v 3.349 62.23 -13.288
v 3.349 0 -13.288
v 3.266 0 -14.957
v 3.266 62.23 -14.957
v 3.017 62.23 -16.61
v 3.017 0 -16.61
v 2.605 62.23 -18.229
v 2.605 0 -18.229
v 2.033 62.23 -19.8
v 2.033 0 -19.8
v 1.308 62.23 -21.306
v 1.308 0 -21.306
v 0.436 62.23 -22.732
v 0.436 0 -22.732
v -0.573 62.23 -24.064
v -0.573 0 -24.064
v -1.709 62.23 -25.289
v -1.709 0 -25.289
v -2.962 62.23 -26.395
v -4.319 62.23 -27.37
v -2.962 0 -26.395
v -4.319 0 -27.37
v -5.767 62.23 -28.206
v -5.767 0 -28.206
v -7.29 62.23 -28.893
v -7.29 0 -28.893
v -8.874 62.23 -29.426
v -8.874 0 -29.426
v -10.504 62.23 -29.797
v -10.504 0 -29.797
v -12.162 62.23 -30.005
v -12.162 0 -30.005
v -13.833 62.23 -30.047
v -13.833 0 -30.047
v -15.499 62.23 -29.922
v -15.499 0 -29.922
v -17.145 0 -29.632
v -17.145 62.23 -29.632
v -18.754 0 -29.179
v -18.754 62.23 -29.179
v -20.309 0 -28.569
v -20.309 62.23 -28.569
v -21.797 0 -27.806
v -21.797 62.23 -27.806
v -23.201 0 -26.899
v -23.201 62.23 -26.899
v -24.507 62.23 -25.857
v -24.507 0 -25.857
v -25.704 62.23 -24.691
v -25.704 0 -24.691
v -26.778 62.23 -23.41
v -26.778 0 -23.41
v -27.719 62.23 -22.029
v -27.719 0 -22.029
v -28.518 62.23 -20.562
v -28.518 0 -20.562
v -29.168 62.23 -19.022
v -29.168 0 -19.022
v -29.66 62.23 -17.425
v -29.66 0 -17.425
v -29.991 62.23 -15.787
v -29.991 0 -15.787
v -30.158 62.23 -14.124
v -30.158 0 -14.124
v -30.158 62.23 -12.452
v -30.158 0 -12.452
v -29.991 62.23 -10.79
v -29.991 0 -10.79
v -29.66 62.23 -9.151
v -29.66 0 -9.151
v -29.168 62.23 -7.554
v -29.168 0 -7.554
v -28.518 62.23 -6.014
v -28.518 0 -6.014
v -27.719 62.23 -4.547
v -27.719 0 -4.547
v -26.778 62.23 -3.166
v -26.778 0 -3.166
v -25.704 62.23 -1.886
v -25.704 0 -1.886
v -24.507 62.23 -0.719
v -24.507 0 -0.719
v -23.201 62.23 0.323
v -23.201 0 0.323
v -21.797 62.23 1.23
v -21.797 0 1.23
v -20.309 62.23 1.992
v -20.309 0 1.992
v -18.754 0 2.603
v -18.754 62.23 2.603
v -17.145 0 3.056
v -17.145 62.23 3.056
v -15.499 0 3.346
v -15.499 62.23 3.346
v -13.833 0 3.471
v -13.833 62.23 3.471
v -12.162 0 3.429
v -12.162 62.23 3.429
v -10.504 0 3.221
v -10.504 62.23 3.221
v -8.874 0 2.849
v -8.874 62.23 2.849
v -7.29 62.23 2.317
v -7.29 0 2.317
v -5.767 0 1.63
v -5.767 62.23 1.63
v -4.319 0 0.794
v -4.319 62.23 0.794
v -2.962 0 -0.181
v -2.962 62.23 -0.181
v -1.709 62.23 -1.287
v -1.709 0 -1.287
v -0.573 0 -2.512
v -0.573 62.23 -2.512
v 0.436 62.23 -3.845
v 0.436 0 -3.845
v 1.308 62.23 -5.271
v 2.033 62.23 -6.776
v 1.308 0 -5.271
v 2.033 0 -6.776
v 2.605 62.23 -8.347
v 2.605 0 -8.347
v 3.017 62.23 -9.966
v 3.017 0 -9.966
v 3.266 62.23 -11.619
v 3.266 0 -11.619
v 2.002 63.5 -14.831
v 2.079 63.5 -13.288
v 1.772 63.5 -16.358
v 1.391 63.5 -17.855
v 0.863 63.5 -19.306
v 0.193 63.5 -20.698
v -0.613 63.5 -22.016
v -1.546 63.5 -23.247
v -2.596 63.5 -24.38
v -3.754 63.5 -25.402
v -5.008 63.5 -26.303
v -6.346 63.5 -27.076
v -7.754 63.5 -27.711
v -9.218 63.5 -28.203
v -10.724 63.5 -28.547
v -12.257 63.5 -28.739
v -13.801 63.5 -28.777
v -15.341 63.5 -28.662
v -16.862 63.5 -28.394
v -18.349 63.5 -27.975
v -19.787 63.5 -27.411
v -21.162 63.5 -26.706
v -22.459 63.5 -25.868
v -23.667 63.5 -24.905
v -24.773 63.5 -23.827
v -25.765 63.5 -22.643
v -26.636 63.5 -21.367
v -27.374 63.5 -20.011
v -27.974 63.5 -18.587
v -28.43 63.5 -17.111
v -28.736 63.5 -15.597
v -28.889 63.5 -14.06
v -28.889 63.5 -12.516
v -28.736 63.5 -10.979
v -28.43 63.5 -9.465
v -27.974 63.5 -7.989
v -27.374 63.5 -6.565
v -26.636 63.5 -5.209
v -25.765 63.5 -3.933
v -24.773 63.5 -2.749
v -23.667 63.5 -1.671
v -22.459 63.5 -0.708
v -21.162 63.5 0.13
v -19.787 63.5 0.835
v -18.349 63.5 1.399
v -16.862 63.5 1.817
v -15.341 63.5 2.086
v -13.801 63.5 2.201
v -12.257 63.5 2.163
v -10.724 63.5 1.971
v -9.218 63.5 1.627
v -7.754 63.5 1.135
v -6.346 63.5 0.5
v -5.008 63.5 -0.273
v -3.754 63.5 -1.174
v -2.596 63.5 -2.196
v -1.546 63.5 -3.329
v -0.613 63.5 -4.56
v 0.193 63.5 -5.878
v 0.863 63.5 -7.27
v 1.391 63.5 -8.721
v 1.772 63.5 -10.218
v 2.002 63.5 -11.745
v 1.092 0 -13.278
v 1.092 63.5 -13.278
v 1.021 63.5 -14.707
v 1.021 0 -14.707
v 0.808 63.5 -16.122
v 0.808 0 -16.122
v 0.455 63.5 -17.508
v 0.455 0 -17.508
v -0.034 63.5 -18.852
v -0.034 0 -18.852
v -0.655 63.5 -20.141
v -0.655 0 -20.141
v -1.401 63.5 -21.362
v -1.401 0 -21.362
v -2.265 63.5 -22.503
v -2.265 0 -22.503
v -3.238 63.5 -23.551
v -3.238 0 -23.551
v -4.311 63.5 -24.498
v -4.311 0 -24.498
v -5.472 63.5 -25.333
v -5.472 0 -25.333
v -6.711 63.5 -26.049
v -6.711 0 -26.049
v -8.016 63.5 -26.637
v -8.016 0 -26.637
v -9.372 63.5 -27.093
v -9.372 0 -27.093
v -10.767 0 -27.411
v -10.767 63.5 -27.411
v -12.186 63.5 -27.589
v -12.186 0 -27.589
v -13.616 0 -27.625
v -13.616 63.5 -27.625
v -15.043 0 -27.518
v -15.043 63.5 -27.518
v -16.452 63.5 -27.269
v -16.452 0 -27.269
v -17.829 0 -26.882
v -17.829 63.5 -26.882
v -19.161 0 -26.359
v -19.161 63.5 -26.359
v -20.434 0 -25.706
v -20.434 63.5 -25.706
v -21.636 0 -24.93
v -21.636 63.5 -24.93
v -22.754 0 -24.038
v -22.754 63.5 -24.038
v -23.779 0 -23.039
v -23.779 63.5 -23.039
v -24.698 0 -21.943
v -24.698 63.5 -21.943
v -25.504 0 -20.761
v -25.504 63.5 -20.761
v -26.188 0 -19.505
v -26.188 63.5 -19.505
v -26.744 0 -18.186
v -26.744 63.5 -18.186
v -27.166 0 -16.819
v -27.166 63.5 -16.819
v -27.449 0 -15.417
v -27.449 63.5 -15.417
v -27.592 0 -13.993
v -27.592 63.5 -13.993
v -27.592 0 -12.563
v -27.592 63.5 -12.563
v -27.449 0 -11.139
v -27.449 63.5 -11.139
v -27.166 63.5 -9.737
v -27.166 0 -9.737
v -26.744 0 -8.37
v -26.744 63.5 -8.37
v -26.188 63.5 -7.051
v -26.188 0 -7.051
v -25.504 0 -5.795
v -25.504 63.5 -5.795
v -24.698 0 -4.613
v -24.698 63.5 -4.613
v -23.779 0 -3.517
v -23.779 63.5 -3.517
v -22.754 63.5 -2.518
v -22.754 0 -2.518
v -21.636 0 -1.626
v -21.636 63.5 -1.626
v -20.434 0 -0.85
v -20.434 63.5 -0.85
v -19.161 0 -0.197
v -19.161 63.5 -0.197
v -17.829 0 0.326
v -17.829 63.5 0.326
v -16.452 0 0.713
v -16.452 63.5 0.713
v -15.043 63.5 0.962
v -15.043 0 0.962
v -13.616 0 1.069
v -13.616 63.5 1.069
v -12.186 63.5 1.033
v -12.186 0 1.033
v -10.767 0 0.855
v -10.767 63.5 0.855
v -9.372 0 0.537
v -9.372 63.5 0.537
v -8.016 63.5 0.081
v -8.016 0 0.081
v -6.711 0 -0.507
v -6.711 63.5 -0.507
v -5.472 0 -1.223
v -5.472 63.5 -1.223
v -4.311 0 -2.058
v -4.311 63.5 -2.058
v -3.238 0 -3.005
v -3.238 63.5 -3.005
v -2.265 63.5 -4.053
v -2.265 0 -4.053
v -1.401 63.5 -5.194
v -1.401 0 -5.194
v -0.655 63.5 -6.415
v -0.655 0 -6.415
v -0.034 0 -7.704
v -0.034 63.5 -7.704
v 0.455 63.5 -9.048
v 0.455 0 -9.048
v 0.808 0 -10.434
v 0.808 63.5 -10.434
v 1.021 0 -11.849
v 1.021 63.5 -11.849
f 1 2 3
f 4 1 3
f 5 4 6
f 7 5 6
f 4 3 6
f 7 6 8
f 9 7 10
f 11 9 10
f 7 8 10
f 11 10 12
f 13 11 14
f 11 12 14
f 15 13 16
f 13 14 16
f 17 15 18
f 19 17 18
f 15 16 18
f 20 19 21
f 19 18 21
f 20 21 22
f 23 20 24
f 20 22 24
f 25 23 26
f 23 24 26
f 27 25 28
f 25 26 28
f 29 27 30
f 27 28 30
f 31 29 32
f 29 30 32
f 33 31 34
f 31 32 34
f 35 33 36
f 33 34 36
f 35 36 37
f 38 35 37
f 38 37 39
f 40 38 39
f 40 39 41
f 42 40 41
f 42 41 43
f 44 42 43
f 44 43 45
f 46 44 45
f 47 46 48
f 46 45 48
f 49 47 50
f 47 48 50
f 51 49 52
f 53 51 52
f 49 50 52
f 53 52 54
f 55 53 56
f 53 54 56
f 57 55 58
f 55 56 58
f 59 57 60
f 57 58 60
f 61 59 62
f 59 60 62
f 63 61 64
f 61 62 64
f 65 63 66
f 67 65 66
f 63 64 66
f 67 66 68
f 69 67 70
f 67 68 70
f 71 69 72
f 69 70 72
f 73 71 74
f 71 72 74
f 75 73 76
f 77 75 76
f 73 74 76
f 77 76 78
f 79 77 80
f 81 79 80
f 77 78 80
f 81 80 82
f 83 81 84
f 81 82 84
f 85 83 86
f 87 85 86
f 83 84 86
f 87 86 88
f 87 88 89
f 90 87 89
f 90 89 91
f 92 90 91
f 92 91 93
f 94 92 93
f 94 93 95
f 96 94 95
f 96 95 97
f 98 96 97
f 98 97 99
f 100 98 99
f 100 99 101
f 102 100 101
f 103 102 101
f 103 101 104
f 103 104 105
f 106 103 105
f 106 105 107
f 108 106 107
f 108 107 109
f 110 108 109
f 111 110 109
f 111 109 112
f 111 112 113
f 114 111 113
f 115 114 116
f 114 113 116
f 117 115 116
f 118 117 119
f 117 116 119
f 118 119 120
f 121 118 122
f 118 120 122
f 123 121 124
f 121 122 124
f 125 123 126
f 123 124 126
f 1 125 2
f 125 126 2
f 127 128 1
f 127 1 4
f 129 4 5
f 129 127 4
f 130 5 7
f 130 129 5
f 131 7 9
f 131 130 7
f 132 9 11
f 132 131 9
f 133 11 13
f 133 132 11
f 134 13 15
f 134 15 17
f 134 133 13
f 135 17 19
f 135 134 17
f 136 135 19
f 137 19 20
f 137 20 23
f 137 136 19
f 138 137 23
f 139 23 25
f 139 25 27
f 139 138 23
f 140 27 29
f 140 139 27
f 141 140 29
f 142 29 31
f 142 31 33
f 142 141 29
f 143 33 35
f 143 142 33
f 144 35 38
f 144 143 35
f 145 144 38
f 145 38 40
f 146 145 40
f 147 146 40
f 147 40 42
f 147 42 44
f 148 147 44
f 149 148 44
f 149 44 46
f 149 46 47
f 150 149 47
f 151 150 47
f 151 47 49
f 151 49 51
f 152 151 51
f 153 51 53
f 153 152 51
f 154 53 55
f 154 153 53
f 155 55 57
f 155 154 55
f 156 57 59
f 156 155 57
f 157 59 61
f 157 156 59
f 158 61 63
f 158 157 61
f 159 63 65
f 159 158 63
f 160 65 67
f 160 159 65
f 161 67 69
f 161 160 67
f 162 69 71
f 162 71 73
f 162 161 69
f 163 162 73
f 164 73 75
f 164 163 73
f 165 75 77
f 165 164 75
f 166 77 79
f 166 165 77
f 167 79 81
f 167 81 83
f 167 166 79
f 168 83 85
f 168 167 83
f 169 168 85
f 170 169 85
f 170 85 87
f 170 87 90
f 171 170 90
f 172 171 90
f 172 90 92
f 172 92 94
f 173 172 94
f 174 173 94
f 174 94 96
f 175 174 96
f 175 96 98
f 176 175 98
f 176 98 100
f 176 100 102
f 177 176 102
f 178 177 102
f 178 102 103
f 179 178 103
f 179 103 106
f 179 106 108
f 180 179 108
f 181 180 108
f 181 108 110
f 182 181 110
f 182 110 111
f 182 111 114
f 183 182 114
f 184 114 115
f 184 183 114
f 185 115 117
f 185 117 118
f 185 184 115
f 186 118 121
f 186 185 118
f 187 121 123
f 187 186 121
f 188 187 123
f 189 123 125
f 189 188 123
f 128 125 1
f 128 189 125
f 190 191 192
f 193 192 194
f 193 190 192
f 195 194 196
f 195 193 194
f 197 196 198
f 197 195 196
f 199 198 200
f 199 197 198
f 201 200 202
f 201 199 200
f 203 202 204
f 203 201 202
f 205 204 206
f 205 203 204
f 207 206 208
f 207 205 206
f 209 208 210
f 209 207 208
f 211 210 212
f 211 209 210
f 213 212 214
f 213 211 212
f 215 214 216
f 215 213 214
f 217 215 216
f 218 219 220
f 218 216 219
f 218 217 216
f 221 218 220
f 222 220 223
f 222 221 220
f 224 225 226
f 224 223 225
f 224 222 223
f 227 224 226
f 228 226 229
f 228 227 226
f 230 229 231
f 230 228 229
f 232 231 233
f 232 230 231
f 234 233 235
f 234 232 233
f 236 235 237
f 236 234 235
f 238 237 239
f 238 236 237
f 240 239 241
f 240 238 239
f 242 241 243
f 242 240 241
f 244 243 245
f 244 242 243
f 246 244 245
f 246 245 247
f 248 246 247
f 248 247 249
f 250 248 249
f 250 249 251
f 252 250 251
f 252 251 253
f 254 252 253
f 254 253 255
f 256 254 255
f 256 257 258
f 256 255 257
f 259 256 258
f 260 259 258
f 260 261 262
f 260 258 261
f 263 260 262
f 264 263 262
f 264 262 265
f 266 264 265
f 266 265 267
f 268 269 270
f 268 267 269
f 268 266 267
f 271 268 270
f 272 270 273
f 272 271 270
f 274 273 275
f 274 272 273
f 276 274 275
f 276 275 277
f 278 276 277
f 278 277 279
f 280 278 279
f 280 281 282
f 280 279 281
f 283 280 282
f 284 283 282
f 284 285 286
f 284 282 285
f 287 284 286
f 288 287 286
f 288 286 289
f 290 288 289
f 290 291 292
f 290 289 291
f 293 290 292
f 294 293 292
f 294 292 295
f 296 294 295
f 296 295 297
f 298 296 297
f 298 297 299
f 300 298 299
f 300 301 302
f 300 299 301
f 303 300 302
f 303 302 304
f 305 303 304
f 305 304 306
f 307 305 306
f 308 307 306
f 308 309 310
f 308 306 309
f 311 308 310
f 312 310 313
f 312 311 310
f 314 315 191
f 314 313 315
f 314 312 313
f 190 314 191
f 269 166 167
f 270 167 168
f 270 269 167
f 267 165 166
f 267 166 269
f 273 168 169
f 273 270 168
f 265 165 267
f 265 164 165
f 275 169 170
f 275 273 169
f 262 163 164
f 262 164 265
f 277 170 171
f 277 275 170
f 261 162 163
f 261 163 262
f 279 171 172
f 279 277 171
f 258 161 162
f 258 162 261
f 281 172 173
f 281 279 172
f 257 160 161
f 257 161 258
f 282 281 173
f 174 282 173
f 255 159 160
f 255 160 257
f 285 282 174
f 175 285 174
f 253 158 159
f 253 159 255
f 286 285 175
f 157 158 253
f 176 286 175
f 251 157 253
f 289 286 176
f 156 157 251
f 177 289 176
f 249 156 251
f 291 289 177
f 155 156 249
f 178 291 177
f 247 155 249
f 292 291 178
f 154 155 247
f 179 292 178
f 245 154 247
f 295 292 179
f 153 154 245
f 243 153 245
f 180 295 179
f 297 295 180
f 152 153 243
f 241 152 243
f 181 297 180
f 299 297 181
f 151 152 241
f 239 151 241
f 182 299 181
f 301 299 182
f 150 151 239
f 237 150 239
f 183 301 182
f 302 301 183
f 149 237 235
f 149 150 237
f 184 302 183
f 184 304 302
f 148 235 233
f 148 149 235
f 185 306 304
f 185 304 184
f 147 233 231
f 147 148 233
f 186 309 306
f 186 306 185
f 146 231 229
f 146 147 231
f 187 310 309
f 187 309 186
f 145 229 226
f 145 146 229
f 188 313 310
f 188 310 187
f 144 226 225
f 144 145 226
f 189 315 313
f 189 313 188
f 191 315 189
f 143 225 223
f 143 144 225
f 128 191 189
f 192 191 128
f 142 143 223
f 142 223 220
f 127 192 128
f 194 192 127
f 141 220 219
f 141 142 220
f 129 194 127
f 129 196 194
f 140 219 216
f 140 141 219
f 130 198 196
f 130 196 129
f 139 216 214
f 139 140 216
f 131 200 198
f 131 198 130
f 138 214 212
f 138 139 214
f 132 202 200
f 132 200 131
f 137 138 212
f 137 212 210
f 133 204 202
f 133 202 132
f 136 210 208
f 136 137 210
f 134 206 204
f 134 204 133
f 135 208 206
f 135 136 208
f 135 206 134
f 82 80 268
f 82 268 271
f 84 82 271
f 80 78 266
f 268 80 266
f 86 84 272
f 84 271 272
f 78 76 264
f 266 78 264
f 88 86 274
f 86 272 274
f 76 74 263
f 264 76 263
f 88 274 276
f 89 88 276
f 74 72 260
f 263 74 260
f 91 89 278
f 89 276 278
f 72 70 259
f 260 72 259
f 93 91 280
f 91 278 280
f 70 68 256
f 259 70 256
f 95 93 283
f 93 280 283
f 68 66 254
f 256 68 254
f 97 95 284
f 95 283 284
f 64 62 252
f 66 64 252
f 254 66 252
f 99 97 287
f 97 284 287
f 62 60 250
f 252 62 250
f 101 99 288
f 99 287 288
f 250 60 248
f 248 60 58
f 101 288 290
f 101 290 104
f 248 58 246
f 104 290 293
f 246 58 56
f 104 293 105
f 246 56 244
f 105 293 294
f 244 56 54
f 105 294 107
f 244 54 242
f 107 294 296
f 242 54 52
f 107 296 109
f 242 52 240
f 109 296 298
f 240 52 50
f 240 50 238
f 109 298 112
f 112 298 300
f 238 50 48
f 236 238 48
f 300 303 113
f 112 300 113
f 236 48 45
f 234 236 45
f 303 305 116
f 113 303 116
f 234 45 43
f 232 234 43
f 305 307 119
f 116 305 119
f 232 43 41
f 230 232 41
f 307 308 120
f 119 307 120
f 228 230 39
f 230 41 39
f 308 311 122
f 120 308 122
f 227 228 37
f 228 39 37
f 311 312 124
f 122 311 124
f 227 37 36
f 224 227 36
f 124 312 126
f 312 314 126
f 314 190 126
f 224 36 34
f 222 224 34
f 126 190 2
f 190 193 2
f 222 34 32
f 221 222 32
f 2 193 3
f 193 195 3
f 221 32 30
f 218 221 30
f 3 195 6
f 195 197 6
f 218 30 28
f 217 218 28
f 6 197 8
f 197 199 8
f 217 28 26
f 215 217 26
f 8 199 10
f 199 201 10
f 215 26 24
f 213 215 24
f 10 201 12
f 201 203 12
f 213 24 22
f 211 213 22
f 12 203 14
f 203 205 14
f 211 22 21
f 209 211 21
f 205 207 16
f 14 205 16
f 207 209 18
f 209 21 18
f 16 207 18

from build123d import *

# Parameters (mm, degrees)
SKETCH1_R           = 16.764
BOSS_EXTRUDE1_DEPTH = 63.5
SKETCH2_R           = 14.351
CUT_EXTRUDE1_DEPTH  = 166.37
CHAMFER1_SIZE       = 1.27


with BuildPart() as part:
    # Sketch1 → Boss-Extrude1 (new body)
    with BuildSketch(Plane(origin=(0, 0, 0), x_dir=(1, 0, 0), z_dir=(0, 1, 0))):
        with Locations((-13.41463778, 13.288084593)):
            Circle(SKETCH1_R)
    extrude(amount=BOSS_EXTRUDE1_DEPTH)

    # Sketch2 → Cut-Extrude1 (cut)
    with BuildSketch(Plane(origin=(0, 0, 0), x_dir=(1, 0, 0), z_dir=(0, 1, 0))):
        with Locations((-13.258576493, 13.278033005)):
            Circle(SKETCH2_R)
    extrude(amount=CUT_EXTRUDE1_DEPTH, mode=Mode.SUBTRACT)

    # Chamfer1
    chamfer1_edges = [part.edges().sort_by_distance(p)[0] for p in [
        (-30.17863778, 63.5, -13.288084593),
    ]]
    chamfer(chamfer1_edges, length=CHAMFER1_SIZE)


solid = part.part
